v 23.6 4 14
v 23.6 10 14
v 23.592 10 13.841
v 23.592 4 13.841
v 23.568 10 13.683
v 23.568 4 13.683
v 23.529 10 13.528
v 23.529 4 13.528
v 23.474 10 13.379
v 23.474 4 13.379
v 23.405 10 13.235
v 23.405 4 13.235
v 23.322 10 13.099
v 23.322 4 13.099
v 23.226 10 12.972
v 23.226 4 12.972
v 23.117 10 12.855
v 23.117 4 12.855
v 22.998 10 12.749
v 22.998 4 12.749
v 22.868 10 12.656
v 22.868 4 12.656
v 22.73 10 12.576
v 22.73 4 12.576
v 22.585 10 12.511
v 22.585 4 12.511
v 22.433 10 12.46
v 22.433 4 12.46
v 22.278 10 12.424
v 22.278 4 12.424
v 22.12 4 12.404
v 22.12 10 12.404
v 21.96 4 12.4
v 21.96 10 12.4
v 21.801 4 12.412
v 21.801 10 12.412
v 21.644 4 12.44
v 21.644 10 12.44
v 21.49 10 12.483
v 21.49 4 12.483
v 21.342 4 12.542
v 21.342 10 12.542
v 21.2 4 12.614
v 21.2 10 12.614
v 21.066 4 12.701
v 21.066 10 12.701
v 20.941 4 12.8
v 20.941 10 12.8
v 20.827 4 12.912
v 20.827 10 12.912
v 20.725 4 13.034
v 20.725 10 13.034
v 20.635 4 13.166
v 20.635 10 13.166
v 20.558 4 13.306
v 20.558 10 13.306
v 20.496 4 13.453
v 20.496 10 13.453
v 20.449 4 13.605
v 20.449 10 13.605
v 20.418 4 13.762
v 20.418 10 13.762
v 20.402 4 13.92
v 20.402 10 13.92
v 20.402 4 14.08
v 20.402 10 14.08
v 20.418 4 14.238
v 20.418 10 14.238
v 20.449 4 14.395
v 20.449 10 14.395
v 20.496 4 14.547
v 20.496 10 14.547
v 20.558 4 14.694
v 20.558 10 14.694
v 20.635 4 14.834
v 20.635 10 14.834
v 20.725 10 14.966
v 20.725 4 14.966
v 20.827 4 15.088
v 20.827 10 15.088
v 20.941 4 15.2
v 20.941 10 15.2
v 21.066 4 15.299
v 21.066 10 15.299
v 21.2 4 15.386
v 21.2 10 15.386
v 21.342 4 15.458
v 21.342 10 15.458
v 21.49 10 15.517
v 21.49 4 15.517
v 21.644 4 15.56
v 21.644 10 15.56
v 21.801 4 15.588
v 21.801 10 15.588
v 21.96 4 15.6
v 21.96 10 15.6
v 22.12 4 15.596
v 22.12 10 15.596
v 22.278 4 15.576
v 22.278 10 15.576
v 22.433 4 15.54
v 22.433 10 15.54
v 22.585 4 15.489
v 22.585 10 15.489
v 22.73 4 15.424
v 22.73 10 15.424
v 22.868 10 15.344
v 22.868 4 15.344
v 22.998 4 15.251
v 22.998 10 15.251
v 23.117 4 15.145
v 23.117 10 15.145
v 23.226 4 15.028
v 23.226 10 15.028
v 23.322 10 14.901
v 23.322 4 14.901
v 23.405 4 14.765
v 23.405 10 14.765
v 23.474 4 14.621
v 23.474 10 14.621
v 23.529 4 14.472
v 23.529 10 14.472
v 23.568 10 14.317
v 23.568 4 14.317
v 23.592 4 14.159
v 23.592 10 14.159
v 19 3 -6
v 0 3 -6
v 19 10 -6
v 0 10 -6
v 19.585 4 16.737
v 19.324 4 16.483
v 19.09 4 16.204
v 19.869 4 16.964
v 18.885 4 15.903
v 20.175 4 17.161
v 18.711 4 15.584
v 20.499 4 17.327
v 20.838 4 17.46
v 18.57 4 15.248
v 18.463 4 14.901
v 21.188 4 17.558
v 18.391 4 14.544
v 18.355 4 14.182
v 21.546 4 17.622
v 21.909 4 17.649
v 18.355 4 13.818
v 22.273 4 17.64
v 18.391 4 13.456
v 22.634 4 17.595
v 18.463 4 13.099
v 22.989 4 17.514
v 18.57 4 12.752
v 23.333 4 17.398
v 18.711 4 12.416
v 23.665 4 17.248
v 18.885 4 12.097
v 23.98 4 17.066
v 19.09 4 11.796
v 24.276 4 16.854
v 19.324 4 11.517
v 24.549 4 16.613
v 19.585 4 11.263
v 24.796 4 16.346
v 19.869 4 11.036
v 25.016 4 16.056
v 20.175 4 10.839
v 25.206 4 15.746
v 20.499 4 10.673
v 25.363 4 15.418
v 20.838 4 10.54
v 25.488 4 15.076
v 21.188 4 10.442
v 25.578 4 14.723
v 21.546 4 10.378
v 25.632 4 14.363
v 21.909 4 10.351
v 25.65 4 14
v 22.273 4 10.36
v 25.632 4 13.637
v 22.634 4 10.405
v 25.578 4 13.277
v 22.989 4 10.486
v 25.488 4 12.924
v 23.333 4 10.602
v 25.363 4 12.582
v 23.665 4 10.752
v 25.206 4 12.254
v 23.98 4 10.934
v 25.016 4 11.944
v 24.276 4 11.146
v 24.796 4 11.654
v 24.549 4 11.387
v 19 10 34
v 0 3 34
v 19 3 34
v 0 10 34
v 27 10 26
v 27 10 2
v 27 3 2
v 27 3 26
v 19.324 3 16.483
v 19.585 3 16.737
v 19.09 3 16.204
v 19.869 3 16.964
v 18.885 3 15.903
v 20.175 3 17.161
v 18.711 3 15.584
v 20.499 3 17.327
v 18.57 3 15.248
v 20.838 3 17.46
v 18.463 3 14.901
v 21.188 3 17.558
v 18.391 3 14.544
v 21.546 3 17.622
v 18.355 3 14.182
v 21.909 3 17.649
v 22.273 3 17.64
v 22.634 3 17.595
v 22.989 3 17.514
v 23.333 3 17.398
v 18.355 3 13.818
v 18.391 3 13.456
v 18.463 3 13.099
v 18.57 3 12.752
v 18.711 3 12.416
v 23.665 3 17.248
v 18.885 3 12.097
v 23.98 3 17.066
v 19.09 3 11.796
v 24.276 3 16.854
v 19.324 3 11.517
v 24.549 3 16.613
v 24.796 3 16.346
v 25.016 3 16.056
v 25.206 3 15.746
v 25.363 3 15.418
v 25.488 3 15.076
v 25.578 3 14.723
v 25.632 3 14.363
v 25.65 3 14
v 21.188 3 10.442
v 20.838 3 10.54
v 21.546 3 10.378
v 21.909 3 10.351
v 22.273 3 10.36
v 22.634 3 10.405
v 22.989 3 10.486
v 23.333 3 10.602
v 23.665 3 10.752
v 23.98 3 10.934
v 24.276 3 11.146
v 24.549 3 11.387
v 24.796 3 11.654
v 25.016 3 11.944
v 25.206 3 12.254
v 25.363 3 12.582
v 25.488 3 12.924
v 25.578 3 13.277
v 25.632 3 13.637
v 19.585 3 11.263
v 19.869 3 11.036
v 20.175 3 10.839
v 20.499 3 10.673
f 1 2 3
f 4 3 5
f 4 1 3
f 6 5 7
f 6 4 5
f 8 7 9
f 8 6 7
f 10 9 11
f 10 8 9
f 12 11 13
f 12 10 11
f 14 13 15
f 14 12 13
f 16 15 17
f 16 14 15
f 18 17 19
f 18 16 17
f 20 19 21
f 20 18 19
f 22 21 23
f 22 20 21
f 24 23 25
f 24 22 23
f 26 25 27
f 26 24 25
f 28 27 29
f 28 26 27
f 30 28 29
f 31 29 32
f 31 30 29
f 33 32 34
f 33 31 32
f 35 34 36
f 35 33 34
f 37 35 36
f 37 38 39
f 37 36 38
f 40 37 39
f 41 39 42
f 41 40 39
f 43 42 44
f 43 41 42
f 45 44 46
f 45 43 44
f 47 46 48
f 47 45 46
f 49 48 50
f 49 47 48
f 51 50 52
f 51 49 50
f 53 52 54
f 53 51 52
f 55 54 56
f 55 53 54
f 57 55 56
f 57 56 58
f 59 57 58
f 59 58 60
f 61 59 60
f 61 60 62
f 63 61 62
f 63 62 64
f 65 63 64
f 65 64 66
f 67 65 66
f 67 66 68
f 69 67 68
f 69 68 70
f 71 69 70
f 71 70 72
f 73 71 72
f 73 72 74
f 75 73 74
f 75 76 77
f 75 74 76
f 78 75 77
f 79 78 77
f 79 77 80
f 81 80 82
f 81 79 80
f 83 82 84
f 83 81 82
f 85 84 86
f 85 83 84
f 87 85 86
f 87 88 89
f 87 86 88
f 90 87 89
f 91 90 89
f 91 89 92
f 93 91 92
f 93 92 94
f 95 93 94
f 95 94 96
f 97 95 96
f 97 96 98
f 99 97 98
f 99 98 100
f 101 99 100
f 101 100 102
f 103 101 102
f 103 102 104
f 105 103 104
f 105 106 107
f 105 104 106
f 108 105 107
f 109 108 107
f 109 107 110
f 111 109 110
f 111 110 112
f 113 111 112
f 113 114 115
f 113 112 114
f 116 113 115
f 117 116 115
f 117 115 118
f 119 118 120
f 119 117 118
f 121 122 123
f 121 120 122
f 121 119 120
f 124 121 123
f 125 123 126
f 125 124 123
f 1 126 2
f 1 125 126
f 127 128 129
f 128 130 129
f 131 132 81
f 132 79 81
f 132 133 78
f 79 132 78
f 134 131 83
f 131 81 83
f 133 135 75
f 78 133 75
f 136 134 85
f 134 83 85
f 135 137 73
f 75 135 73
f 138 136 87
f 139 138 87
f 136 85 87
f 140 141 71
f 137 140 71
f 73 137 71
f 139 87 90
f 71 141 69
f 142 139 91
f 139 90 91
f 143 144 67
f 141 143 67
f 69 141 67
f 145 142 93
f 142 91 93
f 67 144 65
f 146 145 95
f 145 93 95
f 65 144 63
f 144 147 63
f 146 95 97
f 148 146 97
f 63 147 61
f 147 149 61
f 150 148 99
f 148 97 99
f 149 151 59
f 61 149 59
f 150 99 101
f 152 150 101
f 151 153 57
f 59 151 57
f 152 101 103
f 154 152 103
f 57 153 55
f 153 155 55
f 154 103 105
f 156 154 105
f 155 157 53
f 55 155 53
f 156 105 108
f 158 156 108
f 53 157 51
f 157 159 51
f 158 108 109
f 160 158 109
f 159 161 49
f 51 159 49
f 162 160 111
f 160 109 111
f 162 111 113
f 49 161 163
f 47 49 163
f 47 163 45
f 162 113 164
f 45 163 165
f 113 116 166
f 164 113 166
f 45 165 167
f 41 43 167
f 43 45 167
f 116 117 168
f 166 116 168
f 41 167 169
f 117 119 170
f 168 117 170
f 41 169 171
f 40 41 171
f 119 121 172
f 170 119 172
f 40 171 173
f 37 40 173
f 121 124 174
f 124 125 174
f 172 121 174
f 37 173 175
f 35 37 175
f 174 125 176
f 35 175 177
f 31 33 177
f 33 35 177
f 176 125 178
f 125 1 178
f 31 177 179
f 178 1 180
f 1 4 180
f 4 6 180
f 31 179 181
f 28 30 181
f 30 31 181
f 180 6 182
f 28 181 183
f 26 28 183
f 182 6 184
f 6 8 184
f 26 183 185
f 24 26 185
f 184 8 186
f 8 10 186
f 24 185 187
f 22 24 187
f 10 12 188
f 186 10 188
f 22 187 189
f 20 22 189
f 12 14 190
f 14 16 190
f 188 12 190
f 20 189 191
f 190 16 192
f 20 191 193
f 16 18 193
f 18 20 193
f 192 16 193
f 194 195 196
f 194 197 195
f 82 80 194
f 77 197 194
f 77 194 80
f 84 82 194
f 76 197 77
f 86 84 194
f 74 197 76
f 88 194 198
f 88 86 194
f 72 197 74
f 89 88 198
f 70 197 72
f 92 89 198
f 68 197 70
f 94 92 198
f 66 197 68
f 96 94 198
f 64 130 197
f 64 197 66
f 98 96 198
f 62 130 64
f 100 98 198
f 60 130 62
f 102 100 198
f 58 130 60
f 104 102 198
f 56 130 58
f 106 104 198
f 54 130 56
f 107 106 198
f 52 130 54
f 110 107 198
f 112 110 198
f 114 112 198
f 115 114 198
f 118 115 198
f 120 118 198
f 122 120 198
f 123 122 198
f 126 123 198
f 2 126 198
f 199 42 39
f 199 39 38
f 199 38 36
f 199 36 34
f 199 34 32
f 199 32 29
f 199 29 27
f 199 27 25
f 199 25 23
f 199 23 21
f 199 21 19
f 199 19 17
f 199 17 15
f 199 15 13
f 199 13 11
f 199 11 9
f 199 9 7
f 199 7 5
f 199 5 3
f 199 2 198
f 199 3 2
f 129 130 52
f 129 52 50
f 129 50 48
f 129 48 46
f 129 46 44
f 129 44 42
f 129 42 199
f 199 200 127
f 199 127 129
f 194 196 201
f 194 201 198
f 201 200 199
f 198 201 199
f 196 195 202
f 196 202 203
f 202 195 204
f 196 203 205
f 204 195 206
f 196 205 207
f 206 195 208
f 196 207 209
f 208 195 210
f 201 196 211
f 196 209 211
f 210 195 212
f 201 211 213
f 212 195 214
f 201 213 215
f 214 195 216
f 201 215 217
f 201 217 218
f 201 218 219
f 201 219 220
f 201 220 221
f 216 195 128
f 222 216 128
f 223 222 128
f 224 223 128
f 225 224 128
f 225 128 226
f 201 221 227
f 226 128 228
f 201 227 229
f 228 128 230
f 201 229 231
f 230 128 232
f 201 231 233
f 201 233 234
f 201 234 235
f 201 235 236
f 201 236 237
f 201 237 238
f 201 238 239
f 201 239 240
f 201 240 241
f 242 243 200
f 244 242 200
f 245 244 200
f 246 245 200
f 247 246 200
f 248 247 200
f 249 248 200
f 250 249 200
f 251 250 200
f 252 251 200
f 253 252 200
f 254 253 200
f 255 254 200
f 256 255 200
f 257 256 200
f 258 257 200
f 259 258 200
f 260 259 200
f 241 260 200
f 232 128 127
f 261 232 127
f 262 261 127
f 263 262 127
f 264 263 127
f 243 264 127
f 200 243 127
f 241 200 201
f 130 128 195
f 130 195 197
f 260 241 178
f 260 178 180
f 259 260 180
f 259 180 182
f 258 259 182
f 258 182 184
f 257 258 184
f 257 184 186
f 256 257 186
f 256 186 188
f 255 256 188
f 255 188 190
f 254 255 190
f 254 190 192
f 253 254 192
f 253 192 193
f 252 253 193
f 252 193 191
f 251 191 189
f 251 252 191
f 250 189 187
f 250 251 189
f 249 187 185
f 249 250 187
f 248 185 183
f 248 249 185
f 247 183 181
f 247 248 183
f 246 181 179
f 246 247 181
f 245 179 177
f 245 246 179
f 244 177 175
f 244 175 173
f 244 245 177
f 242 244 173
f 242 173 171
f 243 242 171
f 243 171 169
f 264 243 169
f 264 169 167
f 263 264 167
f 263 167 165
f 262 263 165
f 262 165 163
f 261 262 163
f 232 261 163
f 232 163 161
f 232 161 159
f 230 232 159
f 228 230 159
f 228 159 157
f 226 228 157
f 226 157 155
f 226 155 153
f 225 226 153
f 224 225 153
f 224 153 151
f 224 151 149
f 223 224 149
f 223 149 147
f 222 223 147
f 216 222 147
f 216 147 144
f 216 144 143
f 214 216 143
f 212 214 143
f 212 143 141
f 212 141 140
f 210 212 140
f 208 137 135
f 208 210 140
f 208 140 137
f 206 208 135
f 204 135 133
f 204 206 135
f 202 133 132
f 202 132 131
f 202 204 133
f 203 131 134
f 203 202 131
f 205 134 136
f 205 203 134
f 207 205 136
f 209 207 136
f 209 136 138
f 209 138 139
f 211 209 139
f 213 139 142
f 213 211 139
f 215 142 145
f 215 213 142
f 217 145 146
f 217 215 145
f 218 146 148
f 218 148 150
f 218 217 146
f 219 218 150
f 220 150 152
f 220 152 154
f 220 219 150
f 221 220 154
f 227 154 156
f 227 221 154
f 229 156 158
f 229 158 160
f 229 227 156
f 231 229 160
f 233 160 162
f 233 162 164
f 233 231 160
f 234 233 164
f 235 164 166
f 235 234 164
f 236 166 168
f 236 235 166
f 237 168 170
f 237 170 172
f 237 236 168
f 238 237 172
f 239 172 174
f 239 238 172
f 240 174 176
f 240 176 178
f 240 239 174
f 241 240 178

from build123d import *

# Parameters (mm, degrees)
CYLINDER003_R         = 3.65
CYLINDER003_DEPTH     = 3
CYLINDER004_R         = 1.6
CYLINDER004_DEPTH     = 10
BOX008_W              = 27
BOX008_H              = 7
BOX008_DEPTH          = 40
CHAMFER020026005_SIZE = 8


with BuildPart() as cylinder003:
    # Cylinder003 → Cylinder003 (new body)
    with BuildSketch(Plane(origin=(0, 0, 0), x_dir=(1, 0, 0), z_dir=(0, 1, 0))):
        Circle(CYLINDER003_R)
    extrude(amount=CYLINDER003_DEPTH)


with BuildPart() as m3_slot:
    # Cylinder004 → Cylinder004 (new body)
    with BuildSketch(Plane(origin=(0, 3, 0), x_dir=(1, 0, 0), z_dir=(0, 1, 0))):
        Circle(CYLINDER004_R)
    extrude(amount=CYLINDER004_DEPTH)

    # Fusion005: union Cylinder003
    add(cylinder003.part)


with BuildPart() as m3_slot_1:
    # Fusion005 placement: moved
    add(m3_slot.part.moved(Location((22, 1, 14))))


with BuildPart() as cut002002002007004004001006015:
    # Box008 → Box008 (new body)
    with BuildSketch(Plane(origin=(0, 3, -6), x_dir=(1, 0, 0), z_dir=(0, 0, 1))):
        with Locations((13.5, 3.5)):
            Rectangle(BOX008_W, BOX008_H)
    extrude(amount=BOX008_DEPTH)

    # Chamfer020026005
    chamfer020026005_edges = [cut002002002007004004001006015.edges().sort_by_distance(p)[0] for p in [
        (27, 6.5, 34),
        (27, 6.5, -6),
    ]]
    chamfer(chamfer020026005_edges, length=CHAMFER020026005_SIZE)

    # Cut002002002007004004001006015: cut m3-slot
    add(m3_slot_1.part, mode=Mode.SUBTRACT)


solid = cut002002002007004004001006015.part
